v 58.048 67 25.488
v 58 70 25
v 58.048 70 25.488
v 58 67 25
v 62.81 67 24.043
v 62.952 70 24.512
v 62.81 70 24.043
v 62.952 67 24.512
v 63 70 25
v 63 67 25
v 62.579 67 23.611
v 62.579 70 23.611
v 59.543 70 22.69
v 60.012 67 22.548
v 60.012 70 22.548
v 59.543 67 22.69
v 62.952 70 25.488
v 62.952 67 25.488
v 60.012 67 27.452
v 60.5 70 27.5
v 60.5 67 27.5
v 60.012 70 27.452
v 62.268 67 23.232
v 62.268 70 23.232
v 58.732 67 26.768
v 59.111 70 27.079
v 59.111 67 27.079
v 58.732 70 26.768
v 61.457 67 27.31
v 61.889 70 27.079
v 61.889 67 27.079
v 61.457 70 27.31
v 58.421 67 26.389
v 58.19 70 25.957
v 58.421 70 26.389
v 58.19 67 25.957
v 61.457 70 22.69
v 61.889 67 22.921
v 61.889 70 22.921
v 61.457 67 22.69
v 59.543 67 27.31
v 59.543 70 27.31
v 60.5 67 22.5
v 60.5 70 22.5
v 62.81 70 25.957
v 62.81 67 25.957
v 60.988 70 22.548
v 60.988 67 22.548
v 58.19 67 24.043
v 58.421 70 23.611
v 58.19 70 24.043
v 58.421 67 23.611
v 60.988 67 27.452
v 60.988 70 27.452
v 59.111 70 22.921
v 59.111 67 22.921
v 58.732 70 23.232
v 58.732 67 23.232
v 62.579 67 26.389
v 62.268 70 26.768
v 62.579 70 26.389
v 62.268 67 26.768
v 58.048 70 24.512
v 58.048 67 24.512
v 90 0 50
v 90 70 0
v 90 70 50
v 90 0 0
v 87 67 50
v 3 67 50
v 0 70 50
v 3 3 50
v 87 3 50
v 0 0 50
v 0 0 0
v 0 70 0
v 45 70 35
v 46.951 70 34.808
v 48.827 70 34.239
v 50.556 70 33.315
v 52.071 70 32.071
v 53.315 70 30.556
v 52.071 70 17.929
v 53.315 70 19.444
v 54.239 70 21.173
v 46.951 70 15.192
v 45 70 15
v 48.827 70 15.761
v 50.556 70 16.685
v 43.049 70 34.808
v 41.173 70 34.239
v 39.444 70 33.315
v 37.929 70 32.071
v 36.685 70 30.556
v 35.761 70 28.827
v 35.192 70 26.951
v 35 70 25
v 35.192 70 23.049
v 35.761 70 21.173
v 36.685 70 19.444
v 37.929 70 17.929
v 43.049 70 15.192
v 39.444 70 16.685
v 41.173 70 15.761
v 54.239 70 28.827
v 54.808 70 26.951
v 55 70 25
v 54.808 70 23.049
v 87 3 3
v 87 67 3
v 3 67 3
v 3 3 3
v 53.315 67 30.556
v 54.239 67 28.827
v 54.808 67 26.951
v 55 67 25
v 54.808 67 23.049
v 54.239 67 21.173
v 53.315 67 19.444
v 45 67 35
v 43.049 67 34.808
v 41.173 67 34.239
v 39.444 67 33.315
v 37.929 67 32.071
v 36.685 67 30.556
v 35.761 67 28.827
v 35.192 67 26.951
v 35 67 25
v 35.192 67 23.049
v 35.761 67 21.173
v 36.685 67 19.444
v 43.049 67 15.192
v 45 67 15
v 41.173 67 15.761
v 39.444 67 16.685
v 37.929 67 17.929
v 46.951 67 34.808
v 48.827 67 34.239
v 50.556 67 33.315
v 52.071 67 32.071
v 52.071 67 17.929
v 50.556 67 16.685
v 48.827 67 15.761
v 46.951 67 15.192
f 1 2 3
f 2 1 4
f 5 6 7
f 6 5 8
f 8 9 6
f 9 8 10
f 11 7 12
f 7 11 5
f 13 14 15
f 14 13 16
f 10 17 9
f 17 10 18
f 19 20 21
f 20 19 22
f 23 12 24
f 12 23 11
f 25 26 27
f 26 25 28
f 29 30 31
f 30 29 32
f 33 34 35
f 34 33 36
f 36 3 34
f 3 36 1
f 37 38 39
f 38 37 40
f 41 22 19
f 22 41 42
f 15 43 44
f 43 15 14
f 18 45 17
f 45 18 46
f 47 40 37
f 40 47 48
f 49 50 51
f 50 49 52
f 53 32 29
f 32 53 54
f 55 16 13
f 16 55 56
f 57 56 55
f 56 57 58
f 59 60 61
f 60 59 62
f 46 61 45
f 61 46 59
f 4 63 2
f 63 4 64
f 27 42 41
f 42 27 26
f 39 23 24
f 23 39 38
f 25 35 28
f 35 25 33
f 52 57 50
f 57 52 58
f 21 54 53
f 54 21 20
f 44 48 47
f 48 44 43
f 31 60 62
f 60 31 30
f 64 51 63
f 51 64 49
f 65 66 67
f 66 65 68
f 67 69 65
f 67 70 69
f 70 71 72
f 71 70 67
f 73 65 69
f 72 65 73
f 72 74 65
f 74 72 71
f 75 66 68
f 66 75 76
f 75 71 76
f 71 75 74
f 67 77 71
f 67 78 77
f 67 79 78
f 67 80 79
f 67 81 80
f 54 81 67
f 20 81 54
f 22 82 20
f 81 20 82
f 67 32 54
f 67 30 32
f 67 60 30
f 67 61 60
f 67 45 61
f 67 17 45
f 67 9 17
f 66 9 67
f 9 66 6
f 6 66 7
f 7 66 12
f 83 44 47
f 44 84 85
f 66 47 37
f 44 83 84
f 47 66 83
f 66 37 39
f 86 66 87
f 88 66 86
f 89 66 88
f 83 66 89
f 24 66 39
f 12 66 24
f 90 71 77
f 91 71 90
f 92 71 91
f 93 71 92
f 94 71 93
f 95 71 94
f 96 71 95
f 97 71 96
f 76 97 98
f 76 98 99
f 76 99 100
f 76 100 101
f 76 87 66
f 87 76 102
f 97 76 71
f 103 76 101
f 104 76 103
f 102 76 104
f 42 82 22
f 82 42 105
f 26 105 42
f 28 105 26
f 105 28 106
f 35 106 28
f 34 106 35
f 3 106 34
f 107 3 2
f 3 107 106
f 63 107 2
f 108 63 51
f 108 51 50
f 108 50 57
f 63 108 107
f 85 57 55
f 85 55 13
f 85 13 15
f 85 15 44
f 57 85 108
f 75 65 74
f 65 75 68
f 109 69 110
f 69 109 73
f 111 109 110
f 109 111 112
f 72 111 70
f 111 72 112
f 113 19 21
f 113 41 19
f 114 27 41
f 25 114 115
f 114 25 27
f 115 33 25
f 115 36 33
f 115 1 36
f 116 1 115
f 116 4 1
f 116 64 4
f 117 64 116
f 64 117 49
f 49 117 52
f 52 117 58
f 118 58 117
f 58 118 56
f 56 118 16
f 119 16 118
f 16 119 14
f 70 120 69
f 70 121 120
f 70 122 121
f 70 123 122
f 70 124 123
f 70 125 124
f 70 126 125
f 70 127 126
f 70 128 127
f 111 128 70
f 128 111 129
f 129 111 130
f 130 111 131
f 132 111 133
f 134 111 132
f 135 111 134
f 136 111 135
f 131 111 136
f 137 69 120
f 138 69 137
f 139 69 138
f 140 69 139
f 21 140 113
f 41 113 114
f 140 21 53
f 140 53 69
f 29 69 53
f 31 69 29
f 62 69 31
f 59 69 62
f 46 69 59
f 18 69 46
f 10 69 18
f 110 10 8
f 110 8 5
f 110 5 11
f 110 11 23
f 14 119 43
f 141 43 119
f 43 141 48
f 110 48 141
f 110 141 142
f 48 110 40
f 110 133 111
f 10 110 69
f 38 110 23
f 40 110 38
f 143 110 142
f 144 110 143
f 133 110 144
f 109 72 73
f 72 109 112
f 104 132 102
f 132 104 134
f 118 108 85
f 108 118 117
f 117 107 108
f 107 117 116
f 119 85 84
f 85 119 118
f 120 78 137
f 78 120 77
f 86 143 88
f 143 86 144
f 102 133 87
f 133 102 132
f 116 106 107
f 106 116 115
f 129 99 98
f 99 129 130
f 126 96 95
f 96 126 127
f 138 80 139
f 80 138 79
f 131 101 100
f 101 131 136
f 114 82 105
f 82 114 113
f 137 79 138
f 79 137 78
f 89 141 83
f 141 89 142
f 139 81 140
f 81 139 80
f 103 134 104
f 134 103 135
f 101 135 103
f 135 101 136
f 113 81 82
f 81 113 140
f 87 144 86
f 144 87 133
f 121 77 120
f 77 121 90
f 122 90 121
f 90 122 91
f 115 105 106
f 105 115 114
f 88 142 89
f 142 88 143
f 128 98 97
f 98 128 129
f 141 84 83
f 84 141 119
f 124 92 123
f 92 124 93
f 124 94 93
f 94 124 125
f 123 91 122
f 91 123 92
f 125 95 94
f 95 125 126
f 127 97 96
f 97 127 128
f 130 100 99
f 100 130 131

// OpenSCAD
$fn = 32;

// ----------------------------------------------------------------------
// Vent box: roundvent enclosure
// ----------------------------------------------------------------------

// --- parameters (mm) ---
box_l = 90;               // box length, X
box_w = 70;               // box width, Y
box_h = 50;               // box height, Z
wall_t = 3;               // shell wall thickness
vent_d = 20;              // central vent diameter
ring_d = 5;               // ring hole diameter
n_ring = 8;               // holes in the ring
ring_r = 15.5;            // ring radius
fit_tol = 0.02;           // tolerance for press fits, mm
free_tol = 0.2;           // tolerance for clearance fits, mm

ring_step = 360 / n_ring;  // ring hole angular step

difference() {
  cube([box_l, box_w, box_h]);
  translate([wall_t, wall_t, wall_t])
    cube([box_l - 2 * wall_t, box_w - 2 * wall_t, box_h]);
  translate([box_l / 2, box_w - wall_t - 1, box_h / 2])
    rotate([-90, 0, 0]) cylinder(h = wall_t + 2, d = vent_d);
  for (i = [0 : n_ring - 1])
    translate([box_l / 2, box_w - wall_t - 1, box_h / 2])
      rotate([0, 0, i * ring_step])
        translate([ring_r, 0, 0]) rotate([-90, 0, 0])
          cylinder(h = wall_t + 2, d = ring_d);
}
